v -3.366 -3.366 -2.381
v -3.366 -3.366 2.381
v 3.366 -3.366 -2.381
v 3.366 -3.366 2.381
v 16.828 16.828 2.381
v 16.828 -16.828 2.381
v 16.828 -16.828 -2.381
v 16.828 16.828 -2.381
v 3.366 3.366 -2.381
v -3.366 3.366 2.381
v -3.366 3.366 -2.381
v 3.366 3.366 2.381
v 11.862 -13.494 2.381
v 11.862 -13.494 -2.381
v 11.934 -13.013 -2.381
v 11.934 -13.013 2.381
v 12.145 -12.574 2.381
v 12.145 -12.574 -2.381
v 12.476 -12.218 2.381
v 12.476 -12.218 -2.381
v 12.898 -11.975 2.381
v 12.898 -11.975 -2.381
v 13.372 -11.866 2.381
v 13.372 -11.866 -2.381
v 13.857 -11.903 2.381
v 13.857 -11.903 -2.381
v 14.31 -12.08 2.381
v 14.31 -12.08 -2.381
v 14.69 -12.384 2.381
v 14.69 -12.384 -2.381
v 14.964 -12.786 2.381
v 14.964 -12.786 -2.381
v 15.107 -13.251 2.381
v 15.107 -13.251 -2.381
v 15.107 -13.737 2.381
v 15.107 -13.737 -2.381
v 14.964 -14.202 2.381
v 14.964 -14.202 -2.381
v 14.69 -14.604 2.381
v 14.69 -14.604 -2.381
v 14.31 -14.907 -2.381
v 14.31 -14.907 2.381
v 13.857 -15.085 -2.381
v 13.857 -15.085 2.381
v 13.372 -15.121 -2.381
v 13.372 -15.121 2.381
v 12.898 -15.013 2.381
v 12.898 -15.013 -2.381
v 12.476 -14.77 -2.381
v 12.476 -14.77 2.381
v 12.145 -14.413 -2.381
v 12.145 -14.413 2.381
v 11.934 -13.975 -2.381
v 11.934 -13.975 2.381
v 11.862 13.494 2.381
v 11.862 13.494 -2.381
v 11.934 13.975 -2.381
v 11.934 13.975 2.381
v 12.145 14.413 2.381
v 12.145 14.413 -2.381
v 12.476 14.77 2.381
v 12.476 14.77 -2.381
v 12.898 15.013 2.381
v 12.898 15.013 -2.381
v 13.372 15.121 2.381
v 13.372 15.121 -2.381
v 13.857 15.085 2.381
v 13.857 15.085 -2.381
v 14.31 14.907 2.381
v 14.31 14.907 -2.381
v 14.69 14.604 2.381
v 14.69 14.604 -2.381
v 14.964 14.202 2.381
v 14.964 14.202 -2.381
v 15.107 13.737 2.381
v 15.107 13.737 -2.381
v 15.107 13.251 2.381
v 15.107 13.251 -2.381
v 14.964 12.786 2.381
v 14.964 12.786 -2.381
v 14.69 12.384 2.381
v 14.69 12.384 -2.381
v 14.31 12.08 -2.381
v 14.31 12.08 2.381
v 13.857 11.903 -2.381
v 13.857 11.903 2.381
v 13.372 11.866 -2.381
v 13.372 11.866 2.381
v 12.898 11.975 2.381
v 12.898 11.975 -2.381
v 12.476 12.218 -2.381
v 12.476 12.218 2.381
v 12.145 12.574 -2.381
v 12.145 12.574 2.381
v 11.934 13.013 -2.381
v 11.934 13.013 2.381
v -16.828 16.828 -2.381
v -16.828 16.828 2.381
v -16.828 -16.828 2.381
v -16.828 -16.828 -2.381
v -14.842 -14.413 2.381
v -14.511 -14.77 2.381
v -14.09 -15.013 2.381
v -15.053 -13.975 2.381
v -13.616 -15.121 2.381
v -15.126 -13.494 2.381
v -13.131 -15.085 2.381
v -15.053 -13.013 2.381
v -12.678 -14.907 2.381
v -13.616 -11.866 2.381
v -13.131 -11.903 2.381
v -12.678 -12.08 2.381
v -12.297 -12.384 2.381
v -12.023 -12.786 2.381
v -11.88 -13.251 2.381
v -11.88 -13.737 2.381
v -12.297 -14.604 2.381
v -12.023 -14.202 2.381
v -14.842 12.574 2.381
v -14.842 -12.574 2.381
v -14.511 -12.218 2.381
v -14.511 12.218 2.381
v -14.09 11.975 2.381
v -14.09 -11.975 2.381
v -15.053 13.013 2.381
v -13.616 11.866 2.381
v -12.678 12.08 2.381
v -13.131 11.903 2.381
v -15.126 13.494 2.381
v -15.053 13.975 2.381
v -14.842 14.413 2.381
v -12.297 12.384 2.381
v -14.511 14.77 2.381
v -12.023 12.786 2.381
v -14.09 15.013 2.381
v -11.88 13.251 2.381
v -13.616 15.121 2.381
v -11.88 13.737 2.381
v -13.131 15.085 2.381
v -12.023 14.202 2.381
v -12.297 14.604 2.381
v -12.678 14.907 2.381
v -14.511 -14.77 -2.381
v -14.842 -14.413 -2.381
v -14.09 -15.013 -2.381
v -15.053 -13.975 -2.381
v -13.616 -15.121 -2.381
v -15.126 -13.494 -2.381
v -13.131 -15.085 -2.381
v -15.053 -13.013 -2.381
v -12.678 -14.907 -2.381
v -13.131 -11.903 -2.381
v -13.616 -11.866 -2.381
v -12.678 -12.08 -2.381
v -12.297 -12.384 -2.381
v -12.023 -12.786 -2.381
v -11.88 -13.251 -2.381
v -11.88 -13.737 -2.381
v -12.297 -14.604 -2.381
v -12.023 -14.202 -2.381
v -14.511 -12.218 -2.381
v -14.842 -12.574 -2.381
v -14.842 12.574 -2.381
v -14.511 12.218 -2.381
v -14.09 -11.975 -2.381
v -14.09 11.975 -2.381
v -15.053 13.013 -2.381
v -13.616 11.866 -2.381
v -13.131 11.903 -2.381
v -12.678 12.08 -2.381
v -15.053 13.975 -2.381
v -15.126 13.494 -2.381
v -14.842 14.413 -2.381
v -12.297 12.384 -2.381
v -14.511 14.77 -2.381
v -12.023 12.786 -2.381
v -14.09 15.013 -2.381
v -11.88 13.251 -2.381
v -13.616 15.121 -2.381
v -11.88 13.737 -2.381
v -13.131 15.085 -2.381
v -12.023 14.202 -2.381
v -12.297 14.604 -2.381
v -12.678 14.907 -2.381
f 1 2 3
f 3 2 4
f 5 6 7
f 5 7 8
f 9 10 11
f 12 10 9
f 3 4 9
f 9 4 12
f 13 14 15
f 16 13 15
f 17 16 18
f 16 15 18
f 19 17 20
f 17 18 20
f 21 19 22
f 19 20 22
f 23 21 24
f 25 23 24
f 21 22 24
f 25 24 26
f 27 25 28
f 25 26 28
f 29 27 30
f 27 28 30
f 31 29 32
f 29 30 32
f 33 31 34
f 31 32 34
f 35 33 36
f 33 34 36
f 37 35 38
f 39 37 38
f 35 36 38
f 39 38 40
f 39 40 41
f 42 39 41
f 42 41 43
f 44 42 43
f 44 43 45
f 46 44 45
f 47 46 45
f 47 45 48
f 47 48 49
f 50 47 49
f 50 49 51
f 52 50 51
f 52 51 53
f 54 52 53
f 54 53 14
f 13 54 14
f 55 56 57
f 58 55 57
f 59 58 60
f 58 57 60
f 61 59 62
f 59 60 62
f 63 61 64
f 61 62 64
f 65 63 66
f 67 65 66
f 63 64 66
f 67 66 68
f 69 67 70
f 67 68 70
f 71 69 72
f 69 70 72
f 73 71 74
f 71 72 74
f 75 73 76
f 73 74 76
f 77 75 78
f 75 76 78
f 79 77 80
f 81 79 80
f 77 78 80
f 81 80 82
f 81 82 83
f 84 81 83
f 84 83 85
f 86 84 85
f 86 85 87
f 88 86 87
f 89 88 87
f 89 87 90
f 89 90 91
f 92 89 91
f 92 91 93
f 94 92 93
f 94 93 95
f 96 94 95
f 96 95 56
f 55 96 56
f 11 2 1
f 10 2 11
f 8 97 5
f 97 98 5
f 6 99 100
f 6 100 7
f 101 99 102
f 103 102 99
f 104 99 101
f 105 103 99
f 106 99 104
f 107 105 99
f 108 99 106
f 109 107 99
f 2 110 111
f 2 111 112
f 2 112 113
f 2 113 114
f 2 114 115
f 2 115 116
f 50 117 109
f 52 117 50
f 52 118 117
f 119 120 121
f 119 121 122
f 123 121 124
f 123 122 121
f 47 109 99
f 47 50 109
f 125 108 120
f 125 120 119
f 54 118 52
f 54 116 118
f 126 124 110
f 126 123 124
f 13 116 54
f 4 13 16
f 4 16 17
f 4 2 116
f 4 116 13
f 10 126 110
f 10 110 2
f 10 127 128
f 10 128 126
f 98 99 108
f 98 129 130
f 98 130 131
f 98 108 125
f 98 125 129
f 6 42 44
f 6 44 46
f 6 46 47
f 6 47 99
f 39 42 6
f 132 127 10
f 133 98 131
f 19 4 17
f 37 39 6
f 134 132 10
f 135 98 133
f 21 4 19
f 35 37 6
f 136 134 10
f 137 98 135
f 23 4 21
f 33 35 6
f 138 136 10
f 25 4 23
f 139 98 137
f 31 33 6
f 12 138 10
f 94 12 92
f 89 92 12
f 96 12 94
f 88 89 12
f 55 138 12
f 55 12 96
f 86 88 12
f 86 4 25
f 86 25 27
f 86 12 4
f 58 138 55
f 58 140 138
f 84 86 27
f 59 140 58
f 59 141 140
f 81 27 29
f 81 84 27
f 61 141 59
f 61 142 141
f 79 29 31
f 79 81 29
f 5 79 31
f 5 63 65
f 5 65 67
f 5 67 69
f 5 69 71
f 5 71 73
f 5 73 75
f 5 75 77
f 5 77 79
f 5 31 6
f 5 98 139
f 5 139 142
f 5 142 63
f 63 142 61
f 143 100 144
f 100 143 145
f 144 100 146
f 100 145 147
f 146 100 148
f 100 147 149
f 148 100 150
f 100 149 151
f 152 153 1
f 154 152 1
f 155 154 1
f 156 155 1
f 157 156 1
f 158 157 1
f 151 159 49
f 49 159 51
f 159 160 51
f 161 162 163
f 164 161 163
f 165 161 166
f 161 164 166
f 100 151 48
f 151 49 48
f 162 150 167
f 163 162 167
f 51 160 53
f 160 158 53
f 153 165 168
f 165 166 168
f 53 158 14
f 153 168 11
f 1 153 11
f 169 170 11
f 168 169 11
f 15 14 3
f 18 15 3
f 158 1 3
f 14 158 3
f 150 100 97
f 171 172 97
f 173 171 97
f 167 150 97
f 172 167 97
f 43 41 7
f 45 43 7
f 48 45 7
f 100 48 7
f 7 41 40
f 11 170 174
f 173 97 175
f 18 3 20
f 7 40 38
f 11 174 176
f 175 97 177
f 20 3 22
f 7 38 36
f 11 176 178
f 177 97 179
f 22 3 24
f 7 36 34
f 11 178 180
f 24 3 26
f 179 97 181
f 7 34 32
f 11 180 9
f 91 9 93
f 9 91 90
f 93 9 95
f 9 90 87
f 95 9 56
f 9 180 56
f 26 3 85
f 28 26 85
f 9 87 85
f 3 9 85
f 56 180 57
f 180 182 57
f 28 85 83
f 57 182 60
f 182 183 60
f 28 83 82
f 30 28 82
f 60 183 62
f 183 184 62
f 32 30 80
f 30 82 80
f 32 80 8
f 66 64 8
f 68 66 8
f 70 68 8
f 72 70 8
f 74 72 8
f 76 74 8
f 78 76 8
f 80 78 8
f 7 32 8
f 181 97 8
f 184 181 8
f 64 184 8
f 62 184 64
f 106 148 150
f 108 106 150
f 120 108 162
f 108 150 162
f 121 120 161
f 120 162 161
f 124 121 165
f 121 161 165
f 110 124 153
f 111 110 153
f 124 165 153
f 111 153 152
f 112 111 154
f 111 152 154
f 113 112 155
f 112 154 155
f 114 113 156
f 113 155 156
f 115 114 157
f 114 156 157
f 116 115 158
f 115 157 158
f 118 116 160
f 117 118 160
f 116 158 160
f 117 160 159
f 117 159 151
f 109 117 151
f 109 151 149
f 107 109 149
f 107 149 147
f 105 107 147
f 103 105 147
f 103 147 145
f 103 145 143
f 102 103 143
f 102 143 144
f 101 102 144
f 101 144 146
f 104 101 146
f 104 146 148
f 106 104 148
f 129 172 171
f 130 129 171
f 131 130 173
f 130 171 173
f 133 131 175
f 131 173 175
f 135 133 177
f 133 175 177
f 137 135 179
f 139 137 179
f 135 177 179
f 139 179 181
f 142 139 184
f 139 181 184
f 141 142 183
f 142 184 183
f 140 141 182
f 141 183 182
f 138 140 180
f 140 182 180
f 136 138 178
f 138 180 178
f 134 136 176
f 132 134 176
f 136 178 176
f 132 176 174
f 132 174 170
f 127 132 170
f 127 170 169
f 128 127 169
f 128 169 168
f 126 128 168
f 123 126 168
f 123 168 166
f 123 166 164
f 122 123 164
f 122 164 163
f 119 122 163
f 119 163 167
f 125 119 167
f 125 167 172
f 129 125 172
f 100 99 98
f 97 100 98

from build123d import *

# Parameters (mm, degrees)
SKETCH2_W                 = 33.655
SKETCH2_H                 = 33.655
BOSS_EXTRUDE1_DEPTH       = 2.38125
CUT_EXTRUDE1_REACH        = 26.27
SKETCH3_W                 = 6.731
SKETCH3_H                 = 6.731
F_4_CLEARANCE_HOLE1_D     = 3.2639
F_4_CLEARANCE_HOLE1_DEPTH = 8.89
F_4_CLEARANCE_HOLE1_TIP   = 0.980574487


with BuildPart() as part:
    # Sketch2 → Boss-Extrude1 (new, symmetric)
    with BuildSketch(Plane.XY):
        Rectangle(SKETCH2_W, SKETCH2_H)
    extrude(amount=BOSS_EXTRUDE1_DEPTH, both=True)

    # Sketch3 → Cut-Extrude1 (cut, up to next)
    with BuildSketch(Plane.XY.offset(2.38125), mode=Mode.PRIVATE) as cut_extrude1_sk1:
        Rectangle(SKETCH3_W, SKETCH3_H)
    cut_extrude1_tool1 = extrude(cut_extrude1_sk1.sketch, amount=-CUT_EXTRUDE1_REACH, mode=Mode.PRIVATE) & part.part
    add(cut_extrude1_tool1.solids().sort_by_distance((0, 0, 2.38125))[0], mode=Mode.SUBTRACT)

    # #4 Clearance Hole1
    with Locations(Plane.XY.offset(2.38125)):
        with Locations((-13.49375, 13.49375), (0, 0), (13.49375, 13.49375), (-13.49375, -13.49375), (13.49375, -13.49375)):
            Hole(F_4_CLEARANCE_HOLE1_D / 2, depth=F_4_CLEARANCE_HOLE1_DEPTH)
            with Locations((0, 0, -(F_4_CLEARANCE_HOLE1_DEPTH + F_4_CLEARANCE_HOLE1_TIP / 2))):  # 118° drill point
                Cone(0, F_4_CLEARANCE_HOLE1_D / 2, F_4_CLEARANCE_HOLE1_TIP, mode=Mode.SUBTRACT)


solid = part.part
